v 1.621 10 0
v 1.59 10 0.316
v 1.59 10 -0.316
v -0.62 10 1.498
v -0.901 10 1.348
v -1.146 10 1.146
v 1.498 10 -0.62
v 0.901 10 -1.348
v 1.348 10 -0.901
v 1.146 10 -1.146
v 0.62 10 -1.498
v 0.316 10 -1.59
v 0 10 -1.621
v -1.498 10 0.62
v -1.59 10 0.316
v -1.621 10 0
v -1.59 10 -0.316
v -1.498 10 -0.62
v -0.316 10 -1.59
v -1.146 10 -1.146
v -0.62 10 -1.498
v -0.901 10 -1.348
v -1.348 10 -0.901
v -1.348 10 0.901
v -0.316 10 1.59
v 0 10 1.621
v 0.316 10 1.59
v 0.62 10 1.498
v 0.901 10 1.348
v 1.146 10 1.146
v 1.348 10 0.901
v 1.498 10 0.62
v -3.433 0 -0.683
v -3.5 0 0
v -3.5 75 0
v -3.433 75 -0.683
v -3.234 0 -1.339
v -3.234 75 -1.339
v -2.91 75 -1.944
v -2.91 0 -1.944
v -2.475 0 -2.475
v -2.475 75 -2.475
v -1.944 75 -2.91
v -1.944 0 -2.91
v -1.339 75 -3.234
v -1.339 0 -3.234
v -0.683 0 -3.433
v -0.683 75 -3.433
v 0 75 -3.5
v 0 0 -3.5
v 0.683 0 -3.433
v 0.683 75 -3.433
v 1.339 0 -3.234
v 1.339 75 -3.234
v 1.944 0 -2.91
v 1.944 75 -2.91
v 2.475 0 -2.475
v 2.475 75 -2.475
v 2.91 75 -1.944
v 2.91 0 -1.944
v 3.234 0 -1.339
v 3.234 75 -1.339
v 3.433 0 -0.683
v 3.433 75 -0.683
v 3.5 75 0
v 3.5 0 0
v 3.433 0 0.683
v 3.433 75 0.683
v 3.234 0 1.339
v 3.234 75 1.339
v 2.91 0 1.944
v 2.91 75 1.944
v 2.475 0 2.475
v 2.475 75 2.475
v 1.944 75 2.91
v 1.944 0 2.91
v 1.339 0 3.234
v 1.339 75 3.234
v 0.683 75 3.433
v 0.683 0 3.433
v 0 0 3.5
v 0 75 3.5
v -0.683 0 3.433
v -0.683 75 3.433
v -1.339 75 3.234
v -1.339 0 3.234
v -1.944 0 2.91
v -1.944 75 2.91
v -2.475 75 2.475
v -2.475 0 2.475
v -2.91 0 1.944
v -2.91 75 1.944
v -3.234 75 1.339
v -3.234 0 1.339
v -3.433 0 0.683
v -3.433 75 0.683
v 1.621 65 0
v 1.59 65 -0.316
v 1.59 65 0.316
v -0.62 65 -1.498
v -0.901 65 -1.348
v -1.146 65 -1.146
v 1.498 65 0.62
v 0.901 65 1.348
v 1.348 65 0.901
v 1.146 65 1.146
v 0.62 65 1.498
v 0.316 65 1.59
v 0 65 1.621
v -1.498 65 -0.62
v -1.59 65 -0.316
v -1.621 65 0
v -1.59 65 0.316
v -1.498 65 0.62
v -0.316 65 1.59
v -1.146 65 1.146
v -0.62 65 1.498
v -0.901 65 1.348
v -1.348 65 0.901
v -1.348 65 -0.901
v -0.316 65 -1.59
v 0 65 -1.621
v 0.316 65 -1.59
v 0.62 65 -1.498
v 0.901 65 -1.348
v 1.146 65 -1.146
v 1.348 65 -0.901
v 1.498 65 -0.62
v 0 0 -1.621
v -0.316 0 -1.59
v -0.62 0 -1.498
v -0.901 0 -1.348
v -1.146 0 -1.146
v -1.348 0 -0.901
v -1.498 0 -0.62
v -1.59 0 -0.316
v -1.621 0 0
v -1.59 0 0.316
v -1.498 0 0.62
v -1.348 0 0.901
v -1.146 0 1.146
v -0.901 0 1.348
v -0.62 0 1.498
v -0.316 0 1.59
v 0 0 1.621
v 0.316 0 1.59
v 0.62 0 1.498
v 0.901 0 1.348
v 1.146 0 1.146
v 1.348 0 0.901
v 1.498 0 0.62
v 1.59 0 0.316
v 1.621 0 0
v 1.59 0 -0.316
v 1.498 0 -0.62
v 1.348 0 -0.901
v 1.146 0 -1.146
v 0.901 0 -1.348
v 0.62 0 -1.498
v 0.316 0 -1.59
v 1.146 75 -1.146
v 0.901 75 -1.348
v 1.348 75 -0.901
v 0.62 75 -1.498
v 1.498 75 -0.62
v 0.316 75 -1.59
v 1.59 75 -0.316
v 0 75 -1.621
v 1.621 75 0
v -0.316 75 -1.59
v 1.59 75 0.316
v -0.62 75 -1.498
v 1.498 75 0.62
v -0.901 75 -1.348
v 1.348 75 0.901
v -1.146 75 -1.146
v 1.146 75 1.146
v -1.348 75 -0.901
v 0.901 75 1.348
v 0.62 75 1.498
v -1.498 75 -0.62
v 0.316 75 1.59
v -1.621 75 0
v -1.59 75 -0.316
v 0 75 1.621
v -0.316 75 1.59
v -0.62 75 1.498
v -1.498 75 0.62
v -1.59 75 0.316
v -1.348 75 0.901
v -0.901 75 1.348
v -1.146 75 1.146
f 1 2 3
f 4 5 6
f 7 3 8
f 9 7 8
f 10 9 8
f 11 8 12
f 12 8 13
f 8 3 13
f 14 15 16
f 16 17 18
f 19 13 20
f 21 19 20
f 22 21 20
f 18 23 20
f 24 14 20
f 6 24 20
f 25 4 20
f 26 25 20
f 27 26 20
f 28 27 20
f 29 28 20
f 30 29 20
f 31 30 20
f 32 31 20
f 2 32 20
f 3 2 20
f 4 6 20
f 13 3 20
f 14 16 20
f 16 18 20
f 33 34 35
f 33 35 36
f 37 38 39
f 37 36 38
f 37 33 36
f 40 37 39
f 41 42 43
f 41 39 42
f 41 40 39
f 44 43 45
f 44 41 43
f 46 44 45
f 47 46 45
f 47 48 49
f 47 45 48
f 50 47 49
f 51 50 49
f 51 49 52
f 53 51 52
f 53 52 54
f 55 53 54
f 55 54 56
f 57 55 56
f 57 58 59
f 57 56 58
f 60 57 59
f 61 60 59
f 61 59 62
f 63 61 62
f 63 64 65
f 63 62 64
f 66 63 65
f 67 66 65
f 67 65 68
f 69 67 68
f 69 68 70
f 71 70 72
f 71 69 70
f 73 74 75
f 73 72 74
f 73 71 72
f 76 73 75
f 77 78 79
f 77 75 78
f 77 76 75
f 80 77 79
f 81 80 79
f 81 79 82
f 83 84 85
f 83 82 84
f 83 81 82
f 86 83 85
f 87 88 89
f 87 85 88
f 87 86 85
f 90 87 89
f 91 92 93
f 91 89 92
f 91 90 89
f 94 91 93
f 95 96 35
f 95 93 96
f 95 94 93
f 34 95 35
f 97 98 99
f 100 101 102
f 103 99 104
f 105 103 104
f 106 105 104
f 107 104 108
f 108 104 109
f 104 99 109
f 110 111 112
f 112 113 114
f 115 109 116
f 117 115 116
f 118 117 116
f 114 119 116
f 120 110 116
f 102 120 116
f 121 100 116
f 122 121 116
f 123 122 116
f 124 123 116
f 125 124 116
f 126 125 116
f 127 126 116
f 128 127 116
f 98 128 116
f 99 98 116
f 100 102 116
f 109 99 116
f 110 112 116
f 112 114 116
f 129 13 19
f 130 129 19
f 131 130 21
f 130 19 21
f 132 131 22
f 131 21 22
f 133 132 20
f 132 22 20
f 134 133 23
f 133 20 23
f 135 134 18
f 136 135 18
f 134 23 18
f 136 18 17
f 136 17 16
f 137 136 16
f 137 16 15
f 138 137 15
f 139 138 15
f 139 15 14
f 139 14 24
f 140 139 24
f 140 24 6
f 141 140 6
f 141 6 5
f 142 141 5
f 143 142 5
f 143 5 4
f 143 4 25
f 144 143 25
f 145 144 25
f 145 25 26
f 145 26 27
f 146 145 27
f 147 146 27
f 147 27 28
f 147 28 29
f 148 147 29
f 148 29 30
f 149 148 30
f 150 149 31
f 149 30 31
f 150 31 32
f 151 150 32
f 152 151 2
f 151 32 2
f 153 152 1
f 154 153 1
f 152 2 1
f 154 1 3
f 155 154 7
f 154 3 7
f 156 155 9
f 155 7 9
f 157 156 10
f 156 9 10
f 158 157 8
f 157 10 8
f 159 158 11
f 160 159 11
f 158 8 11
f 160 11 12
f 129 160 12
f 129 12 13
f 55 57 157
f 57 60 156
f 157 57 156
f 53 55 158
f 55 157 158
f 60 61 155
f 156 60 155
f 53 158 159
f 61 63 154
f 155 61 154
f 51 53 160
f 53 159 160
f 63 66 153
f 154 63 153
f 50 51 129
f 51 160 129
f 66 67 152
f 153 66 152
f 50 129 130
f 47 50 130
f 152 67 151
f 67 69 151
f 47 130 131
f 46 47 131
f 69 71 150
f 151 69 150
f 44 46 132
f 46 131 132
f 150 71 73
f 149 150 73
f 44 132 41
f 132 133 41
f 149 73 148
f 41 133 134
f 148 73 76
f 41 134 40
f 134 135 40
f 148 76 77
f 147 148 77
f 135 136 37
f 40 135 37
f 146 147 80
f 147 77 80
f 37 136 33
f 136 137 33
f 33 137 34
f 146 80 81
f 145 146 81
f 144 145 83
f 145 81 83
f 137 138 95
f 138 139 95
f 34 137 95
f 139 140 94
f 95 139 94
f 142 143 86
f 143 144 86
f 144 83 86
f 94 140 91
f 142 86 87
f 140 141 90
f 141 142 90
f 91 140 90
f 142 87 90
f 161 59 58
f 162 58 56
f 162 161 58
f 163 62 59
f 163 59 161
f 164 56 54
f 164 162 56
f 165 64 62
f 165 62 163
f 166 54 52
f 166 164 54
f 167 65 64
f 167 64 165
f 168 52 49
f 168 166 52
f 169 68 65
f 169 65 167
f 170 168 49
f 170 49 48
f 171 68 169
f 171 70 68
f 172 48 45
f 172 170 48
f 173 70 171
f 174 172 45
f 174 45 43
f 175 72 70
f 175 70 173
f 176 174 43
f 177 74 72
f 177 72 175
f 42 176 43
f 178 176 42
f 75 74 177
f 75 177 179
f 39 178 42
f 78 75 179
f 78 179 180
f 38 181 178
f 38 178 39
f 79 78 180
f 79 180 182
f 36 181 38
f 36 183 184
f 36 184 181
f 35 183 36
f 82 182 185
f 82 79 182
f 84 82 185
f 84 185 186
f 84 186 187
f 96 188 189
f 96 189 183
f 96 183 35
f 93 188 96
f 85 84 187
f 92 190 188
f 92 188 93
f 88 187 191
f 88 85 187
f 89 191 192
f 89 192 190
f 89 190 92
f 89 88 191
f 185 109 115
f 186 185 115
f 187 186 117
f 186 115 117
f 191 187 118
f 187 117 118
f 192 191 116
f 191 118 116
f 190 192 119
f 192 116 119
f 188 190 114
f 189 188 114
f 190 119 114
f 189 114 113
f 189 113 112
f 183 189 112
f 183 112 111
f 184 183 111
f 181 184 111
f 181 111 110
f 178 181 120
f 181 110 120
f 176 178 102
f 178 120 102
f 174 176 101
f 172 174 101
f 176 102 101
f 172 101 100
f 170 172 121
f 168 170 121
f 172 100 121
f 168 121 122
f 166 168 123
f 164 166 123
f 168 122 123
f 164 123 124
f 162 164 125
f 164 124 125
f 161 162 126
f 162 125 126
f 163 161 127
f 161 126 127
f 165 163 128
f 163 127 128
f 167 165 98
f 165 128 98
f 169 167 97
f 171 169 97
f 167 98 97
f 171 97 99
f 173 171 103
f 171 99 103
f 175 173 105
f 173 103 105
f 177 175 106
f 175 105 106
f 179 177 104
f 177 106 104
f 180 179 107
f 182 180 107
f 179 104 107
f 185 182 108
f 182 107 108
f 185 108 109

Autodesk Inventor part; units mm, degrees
ref_plane "YZ Plane" through (0, 0, 0) normal (1, 0, 0) x (0, 1, 0)
ref_plane "XZ Plane" through (0, 0, 0) normal (0, 1, 0) x (-1, 0, 0)
ref_plane "XY Plane" through (0, 0, 0) normal (0, 0, 1) x (1, 0, 0)
sketch "Sketch1" plane through (0, 0, 0) normal (0, 1, 0) x (-1, 0, 0)
  circle A0 centre (0, 0) radius 3.5
  dimension "d0" = 7
extrude "Extrusion1" add sketch "Sketch1" along normal blind 75
sketch "Sketch2" plane through (0, 75, 0) normal (0, 1, 0) x (1, 0, 0)
  circle A0 centre (0, 0) radius 3.5 projected
hole "Hole1" at (0, 75, 0) direction (0, -1, 0) diameter 3.242 depth 10 thread size "M4x0.7" class "6H" standard "ISO Metric profile"
sketch "Sketch3" plane through (0, 0, 0) normal (0, -1, 0) x (1, 0, 0)
  circle A0 centre (0, 0) radius 3.5 projected
hole "Hole2" at (0, 0, 0) direction (0, 1, 0) diameter 3.242 depth 10 thread size "M4x0.7" class "6H" standard "ISO Metric profile"
properties part number "214.3"
